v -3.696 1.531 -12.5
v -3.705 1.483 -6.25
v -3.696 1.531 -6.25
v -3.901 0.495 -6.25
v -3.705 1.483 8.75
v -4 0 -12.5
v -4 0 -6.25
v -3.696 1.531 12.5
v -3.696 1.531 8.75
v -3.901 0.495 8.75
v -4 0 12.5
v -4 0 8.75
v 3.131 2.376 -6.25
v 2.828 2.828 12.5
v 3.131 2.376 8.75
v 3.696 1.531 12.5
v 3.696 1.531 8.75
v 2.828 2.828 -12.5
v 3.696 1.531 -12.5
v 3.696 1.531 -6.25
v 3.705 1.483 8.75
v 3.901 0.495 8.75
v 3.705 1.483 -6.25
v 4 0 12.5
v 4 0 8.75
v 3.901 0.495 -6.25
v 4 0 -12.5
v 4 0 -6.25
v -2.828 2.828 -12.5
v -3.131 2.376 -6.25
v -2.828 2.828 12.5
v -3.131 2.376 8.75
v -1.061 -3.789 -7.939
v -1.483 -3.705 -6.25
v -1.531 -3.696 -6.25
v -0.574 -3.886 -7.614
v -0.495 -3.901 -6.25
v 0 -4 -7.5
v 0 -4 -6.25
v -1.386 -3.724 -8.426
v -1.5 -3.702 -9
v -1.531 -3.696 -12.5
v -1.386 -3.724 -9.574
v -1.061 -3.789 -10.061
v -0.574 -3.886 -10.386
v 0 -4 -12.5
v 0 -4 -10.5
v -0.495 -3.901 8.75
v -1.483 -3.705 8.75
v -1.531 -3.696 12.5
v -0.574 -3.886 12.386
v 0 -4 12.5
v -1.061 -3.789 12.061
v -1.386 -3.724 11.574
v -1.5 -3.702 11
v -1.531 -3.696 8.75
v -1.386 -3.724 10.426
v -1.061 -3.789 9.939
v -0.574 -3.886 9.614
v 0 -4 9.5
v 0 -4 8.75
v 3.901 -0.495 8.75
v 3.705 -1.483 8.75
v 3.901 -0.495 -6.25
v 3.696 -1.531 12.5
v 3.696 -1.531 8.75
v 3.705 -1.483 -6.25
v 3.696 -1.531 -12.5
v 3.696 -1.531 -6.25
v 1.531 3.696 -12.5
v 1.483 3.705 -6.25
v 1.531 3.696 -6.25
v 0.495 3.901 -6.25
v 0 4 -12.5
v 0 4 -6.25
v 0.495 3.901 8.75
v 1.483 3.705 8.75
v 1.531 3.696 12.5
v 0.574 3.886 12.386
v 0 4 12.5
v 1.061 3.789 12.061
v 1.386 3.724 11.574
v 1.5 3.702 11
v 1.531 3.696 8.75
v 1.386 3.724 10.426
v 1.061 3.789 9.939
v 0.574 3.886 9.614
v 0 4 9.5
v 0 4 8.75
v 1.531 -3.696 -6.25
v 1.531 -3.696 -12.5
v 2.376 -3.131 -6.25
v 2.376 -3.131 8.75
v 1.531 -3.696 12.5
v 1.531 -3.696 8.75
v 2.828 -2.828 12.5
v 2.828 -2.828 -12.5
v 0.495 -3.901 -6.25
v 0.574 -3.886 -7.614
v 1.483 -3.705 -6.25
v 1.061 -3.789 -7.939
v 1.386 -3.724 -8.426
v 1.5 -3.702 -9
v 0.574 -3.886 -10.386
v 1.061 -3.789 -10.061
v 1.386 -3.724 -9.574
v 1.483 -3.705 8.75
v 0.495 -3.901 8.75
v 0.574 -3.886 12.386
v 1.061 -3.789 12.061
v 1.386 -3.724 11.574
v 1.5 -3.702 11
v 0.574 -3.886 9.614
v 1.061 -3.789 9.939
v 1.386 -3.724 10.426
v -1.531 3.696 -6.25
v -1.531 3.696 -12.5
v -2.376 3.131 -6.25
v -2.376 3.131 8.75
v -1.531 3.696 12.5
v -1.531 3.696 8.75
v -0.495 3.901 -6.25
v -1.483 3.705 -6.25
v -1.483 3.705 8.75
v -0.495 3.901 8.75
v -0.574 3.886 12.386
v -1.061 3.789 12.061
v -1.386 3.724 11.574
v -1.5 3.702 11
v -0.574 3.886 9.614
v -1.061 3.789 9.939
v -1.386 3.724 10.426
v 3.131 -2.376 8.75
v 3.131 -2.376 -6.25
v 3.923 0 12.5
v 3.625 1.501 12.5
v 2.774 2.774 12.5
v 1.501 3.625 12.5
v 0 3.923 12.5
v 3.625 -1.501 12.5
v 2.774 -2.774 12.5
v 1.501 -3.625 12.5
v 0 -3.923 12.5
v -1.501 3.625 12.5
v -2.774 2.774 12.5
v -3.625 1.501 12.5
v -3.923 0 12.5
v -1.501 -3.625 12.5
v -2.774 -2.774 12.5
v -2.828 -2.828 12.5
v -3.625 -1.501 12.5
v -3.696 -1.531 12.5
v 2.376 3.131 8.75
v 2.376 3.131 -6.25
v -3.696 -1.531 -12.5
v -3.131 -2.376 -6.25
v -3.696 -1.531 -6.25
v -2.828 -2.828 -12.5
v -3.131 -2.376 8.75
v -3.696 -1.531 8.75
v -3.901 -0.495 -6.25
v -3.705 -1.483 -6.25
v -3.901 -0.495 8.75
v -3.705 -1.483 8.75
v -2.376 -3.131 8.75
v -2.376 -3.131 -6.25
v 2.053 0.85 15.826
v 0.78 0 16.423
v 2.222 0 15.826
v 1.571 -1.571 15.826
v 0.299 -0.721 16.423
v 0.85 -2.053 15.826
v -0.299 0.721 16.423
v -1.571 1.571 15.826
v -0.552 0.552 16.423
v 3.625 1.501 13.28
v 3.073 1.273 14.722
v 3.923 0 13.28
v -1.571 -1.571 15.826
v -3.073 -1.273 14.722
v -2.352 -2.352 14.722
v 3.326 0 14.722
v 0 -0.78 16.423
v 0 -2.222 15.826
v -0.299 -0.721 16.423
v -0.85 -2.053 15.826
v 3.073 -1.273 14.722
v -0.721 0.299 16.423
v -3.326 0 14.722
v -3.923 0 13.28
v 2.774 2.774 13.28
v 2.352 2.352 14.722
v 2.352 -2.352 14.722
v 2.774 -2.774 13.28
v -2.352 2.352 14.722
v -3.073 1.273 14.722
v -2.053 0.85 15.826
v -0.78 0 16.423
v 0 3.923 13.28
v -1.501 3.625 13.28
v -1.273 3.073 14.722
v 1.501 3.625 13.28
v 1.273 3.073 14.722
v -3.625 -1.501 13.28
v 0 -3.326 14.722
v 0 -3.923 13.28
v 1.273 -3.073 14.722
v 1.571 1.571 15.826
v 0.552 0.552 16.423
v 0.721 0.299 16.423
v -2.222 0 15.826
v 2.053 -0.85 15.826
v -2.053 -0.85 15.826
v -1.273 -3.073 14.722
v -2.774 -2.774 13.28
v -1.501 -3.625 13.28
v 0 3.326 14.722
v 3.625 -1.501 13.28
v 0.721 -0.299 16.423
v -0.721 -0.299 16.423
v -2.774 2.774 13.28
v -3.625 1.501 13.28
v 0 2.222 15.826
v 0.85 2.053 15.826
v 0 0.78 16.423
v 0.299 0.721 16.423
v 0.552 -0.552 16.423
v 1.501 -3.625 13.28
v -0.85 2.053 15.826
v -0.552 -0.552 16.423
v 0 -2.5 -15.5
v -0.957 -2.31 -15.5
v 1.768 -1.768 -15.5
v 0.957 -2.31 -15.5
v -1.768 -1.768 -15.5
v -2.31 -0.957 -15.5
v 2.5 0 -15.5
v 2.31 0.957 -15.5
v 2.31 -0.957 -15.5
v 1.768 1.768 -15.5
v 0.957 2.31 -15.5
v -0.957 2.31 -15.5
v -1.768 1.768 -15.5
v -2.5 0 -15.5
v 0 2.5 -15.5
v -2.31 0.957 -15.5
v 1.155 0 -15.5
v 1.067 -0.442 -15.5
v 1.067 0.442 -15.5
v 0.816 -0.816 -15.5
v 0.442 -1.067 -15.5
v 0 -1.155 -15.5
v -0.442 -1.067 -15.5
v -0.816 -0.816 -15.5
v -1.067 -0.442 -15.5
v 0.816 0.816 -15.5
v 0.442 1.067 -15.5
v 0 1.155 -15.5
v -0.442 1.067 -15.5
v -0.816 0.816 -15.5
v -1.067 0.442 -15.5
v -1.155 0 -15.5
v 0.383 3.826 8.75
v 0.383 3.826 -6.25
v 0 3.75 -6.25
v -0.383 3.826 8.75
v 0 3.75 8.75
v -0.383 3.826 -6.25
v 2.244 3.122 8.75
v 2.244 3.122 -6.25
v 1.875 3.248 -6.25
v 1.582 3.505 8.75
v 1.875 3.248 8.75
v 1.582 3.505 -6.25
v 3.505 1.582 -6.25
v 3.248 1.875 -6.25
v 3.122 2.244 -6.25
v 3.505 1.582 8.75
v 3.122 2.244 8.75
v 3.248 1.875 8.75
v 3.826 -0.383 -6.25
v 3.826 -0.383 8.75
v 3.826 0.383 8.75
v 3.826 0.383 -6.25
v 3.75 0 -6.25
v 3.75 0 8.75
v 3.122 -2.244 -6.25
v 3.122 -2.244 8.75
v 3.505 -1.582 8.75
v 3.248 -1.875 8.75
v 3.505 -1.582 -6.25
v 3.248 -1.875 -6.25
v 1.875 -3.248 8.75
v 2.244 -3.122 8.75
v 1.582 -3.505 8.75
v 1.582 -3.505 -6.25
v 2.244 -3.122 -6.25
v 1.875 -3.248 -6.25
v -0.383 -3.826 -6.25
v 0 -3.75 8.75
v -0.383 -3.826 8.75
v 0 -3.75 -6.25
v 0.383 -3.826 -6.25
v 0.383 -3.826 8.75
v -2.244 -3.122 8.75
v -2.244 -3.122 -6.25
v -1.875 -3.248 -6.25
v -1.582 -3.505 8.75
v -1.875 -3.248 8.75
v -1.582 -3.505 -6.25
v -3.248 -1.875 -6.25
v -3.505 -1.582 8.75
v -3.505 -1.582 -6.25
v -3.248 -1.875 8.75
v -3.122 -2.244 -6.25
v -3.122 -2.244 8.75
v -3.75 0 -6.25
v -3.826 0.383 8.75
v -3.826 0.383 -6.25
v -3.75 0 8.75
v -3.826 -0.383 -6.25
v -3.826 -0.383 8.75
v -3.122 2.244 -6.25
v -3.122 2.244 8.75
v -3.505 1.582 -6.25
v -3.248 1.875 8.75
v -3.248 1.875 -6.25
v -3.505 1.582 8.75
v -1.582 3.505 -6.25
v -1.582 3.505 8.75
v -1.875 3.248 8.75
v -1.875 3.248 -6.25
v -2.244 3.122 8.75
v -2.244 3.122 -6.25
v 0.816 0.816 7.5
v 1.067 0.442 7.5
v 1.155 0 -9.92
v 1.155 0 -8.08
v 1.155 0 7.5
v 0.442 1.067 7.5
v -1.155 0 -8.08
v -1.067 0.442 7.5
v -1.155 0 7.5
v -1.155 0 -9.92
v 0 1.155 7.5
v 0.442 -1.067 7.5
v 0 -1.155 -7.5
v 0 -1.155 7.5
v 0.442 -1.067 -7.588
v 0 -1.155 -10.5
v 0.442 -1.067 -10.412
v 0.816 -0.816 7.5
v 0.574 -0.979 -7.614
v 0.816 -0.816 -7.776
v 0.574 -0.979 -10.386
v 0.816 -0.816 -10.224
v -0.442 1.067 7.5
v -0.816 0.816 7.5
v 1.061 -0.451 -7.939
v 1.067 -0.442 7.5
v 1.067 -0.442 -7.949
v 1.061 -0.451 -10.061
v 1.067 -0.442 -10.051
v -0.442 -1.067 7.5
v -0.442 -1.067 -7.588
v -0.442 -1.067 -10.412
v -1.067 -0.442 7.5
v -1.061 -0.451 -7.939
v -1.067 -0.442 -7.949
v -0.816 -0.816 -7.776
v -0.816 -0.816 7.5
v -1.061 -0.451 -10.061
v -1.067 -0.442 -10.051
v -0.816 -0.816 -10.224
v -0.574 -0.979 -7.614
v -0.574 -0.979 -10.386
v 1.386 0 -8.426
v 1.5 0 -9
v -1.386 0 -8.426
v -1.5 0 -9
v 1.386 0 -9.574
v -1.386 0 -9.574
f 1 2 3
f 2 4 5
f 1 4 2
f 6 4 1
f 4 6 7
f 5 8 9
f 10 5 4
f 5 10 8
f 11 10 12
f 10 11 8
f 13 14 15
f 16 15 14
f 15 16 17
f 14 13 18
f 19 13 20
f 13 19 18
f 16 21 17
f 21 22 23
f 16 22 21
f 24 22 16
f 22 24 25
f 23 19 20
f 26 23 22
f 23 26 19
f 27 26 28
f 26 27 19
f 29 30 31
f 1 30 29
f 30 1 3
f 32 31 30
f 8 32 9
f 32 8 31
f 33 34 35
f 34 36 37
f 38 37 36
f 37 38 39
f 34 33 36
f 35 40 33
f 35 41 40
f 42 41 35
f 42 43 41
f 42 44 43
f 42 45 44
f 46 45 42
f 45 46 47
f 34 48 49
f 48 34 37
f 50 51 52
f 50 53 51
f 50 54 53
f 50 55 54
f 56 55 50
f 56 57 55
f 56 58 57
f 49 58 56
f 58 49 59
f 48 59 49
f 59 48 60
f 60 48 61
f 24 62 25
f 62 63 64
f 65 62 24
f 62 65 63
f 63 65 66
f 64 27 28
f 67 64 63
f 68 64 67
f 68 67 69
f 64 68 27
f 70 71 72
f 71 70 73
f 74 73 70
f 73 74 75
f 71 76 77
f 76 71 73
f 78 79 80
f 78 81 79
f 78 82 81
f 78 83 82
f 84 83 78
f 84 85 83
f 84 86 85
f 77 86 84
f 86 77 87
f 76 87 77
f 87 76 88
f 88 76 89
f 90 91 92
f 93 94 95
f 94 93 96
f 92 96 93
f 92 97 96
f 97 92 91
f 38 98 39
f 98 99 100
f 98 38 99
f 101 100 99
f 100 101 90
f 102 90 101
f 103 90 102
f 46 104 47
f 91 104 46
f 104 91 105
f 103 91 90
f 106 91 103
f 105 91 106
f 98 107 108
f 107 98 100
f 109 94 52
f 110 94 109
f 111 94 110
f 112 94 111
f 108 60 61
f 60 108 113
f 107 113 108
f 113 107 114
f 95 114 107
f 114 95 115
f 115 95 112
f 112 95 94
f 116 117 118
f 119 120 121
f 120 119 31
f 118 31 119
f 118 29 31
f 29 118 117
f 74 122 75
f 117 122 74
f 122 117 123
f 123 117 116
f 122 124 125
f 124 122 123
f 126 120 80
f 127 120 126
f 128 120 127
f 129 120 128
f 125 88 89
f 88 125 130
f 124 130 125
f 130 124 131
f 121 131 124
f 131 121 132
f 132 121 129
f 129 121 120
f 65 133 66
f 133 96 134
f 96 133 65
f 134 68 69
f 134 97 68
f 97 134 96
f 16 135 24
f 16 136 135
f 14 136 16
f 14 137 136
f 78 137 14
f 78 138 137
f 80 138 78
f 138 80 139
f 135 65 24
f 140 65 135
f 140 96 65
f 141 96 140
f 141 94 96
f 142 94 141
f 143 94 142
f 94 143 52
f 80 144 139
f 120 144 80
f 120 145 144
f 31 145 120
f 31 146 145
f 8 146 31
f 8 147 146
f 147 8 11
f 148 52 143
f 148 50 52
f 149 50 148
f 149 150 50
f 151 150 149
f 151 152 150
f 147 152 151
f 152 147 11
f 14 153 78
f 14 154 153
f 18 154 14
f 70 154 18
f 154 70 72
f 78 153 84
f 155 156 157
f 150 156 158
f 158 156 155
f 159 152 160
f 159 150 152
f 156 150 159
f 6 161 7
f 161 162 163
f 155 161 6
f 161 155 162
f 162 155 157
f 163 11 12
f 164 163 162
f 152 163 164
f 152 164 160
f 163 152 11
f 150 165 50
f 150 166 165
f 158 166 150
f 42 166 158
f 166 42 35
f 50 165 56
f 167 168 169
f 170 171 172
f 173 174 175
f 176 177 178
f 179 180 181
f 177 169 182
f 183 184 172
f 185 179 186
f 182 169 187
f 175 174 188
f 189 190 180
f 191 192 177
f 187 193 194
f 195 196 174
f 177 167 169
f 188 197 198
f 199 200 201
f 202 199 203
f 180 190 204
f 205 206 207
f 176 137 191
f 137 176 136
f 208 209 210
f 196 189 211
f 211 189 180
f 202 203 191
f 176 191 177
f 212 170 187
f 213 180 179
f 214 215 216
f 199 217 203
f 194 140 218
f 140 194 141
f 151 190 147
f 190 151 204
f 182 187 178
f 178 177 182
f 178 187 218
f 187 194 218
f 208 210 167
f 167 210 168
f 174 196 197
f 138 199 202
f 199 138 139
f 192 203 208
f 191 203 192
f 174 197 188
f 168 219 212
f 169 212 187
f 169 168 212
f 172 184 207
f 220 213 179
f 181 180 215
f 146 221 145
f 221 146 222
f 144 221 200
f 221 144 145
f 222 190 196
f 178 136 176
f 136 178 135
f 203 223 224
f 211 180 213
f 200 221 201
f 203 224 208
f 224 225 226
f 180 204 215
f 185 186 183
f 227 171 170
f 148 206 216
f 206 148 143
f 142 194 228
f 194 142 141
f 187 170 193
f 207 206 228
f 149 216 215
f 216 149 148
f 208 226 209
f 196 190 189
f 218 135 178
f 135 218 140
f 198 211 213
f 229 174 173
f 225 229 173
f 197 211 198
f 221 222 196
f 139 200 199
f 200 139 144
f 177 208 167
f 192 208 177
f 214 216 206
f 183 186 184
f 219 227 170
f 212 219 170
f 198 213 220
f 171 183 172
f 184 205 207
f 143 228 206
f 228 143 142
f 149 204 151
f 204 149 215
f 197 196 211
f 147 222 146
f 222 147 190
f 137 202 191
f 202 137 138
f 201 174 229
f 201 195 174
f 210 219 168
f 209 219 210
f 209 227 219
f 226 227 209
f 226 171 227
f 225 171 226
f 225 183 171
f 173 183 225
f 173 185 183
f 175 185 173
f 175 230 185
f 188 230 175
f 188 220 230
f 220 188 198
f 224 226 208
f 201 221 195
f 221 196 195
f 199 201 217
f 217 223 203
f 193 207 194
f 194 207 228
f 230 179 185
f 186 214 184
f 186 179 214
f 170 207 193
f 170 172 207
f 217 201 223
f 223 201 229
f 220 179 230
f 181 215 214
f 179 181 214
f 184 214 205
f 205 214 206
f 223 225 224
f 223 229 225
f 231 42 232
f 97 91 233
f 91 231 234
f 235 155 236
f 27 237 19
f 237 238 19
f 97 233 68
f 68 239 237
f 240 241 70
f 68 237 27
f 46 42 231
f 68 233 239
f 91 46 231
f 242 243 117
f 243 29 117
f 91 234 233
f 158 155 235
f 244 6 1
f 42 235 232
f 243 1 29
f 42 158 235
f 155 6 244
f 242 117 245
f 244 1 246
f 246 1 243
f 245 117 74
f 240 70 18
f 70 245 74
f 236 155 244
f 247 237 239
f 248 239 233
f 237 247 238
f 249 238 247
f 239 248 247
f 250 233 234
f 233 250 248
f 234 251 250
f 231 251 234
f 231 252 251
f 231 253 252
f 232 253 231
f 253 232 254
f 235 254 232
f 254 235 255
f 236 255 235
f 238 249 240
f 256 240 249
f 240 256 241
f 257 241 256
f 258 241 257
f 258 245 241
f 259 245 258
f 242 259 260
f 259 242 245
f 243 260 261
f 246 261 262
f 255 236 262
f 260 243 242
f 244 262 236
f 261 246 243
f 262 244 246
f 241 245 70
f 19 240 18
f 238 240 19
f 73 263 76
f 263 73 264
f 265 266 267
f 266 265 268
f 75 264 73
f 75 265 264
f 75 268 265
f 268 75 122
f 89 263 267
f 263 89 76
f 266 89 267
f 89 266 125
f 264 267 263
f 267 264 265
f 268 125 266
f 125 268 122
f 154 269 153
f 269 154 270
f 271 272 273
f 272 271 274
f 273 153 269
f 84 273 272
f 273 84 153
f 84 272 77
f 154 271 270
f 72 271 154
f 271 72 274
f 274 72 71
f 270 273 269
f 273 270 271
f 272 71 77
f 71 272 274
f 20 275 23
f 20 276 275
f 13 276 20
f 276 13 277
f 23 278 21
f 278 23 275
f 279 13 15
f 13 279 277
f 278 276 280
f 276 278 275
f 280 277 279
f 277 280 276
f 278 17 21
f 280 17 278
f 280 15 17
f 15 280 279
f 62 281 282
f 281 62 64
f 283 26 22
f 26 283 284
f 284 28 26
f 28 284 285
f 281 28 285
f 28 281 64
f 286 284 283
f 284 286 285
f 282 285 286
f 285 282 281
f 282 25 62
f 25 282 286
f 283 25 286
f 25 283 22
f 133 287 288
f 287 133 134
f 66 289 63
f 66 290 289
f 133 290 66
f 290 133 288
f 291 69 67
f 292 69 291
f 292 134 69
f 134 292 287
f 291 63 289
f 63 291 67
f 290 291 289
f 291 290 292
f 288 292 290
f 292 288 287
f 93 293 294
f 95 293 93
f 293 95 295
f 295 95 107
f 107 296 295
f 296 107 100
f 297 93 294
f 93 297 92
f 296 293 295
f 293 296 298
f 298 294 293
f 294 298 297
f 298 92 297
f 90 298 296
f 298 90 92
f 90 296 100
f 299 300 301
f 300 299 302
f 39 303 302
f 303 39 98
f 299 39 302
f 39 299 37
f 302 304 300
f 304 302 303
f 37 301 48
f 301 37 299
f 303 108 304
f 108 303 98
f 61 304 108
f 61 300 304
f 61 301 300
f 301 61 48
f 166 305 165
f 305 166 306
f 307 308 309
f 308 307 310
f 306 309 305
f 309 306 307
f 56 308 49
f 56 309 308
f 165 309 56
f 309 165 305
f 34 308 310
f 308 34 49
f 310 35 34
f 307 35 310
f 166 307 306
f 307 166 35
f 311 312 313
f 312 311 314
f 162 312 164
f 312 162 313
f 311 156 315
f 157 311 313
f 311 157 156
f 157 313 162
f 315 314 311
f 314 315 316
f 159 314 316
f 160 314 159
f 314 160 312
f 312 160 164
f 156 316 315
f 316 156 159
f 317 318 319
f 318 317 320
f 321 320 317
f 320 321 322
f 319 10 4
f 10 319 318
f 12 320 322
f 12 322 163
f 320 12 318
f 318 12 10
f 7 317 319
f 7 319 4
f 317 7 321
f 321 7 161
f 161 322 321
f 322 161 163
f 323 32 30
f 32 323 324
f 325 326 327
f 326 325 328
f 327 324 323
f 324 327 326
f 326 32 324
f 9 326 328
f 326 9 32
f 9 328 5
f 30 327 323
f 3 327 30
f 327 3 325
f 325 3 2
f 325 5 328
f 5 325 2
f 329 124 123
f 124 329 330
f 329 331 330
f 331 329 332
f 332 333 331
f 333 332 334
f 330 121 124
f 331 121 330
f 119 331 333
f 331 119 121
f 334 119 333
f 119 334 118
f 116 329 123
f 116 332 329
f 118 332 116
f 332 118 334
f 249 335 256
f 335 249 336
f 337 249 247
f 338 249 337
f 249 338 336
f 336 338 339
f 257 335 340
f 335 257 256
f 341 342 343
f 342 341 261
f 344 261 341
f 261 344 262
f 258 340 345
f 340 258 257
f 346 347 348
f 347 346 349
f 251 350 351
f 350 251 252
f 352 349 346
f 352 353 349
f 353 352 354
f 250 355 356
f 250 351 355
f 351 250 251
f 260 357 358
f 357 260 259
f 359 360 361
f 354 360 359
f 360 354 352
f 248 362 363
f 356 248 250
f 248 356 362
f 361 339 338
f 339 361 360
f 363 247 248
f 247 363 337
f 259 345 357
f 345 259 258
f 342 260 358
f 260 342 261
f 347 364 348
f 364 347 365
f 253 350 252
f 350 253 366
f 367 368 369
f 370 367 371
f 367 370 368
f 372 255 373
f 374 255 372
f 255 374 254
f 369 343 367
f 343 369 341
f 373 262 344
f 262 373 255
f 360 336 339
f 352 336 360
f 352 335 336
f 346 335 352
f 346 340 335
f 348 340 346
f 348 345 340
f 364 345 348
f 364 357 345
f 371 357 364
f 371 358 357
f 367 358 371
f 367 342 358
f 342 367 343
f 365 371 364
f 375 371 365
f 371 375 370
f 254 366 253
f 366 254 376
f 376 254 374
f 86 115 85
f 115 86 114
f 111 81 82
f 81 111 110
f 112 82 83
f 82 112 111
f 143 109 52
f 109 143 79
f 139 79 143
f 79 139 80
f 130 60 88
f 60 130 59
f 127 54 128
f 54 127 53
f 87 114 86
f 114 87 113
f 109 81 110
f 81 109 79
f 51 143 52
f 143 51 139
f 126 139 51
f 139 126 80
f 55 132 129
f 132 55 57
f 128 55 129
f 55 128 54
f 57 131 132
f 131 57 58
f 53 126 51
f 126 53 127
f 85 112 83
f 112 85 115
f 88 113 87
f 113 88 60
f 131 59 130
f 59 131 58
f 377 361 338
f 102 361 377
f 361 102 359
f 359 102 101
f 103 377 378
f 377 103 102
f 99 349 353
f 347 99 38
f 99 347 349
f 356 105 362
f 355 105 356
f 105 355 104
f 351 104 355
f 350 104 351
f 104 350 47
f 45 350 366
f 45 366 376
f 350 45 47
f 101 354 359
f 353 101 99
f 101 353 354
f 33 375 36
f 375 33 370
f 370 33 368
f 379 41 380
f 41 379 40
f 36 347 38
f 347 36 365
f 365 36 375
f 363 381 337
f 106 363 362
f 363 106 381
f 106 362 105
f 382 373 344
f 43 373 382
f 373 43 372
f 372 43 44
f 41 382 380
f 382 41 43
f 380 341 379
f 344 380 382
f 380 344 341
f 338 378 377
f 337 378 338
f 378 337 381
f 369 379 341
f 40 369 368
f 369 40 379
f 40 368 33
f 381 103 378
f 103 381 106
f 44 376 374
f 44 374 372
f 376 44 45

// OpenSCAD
// Author: Martin Cloutier
// Date  : 2017-02-08
// Email : mxclouti@gmail.com

$fn=16;  // Adjust

HoleSize = 2.0;  // Adjust
HoleRadius = (2*HoleSize)/sqrt(3)/2;

module handle()
{
    union()
    {
      cylinder(r=4,h=25,center=true);   
      translate([0,0,12.5]) sphere(r=4);
      translate([0,0,-14.0]) cylinder(h=3,r1=2.5,r2=4,center=true);
    }
}

difference()
{
  handle();
  translate([0,0,-5]) cylinder(r=HoleRadius,h=25,center=true);    
  for (a = [0 : 30 : 359])
  {
    rotate([0, 0, -a])
    translate([0, 4.75, 1.25])
    cylinder(r=1.0,h=15,center=true);
  }   
  
  rotate([90,0,0])
  translate([0,11,0])
  cylinder(r=1.5,h=20,center=true);
  
  rotate([90,0,0])
  translate([0,-9,5])
  cylinder(r=1.5,h=10,center=true);
}


